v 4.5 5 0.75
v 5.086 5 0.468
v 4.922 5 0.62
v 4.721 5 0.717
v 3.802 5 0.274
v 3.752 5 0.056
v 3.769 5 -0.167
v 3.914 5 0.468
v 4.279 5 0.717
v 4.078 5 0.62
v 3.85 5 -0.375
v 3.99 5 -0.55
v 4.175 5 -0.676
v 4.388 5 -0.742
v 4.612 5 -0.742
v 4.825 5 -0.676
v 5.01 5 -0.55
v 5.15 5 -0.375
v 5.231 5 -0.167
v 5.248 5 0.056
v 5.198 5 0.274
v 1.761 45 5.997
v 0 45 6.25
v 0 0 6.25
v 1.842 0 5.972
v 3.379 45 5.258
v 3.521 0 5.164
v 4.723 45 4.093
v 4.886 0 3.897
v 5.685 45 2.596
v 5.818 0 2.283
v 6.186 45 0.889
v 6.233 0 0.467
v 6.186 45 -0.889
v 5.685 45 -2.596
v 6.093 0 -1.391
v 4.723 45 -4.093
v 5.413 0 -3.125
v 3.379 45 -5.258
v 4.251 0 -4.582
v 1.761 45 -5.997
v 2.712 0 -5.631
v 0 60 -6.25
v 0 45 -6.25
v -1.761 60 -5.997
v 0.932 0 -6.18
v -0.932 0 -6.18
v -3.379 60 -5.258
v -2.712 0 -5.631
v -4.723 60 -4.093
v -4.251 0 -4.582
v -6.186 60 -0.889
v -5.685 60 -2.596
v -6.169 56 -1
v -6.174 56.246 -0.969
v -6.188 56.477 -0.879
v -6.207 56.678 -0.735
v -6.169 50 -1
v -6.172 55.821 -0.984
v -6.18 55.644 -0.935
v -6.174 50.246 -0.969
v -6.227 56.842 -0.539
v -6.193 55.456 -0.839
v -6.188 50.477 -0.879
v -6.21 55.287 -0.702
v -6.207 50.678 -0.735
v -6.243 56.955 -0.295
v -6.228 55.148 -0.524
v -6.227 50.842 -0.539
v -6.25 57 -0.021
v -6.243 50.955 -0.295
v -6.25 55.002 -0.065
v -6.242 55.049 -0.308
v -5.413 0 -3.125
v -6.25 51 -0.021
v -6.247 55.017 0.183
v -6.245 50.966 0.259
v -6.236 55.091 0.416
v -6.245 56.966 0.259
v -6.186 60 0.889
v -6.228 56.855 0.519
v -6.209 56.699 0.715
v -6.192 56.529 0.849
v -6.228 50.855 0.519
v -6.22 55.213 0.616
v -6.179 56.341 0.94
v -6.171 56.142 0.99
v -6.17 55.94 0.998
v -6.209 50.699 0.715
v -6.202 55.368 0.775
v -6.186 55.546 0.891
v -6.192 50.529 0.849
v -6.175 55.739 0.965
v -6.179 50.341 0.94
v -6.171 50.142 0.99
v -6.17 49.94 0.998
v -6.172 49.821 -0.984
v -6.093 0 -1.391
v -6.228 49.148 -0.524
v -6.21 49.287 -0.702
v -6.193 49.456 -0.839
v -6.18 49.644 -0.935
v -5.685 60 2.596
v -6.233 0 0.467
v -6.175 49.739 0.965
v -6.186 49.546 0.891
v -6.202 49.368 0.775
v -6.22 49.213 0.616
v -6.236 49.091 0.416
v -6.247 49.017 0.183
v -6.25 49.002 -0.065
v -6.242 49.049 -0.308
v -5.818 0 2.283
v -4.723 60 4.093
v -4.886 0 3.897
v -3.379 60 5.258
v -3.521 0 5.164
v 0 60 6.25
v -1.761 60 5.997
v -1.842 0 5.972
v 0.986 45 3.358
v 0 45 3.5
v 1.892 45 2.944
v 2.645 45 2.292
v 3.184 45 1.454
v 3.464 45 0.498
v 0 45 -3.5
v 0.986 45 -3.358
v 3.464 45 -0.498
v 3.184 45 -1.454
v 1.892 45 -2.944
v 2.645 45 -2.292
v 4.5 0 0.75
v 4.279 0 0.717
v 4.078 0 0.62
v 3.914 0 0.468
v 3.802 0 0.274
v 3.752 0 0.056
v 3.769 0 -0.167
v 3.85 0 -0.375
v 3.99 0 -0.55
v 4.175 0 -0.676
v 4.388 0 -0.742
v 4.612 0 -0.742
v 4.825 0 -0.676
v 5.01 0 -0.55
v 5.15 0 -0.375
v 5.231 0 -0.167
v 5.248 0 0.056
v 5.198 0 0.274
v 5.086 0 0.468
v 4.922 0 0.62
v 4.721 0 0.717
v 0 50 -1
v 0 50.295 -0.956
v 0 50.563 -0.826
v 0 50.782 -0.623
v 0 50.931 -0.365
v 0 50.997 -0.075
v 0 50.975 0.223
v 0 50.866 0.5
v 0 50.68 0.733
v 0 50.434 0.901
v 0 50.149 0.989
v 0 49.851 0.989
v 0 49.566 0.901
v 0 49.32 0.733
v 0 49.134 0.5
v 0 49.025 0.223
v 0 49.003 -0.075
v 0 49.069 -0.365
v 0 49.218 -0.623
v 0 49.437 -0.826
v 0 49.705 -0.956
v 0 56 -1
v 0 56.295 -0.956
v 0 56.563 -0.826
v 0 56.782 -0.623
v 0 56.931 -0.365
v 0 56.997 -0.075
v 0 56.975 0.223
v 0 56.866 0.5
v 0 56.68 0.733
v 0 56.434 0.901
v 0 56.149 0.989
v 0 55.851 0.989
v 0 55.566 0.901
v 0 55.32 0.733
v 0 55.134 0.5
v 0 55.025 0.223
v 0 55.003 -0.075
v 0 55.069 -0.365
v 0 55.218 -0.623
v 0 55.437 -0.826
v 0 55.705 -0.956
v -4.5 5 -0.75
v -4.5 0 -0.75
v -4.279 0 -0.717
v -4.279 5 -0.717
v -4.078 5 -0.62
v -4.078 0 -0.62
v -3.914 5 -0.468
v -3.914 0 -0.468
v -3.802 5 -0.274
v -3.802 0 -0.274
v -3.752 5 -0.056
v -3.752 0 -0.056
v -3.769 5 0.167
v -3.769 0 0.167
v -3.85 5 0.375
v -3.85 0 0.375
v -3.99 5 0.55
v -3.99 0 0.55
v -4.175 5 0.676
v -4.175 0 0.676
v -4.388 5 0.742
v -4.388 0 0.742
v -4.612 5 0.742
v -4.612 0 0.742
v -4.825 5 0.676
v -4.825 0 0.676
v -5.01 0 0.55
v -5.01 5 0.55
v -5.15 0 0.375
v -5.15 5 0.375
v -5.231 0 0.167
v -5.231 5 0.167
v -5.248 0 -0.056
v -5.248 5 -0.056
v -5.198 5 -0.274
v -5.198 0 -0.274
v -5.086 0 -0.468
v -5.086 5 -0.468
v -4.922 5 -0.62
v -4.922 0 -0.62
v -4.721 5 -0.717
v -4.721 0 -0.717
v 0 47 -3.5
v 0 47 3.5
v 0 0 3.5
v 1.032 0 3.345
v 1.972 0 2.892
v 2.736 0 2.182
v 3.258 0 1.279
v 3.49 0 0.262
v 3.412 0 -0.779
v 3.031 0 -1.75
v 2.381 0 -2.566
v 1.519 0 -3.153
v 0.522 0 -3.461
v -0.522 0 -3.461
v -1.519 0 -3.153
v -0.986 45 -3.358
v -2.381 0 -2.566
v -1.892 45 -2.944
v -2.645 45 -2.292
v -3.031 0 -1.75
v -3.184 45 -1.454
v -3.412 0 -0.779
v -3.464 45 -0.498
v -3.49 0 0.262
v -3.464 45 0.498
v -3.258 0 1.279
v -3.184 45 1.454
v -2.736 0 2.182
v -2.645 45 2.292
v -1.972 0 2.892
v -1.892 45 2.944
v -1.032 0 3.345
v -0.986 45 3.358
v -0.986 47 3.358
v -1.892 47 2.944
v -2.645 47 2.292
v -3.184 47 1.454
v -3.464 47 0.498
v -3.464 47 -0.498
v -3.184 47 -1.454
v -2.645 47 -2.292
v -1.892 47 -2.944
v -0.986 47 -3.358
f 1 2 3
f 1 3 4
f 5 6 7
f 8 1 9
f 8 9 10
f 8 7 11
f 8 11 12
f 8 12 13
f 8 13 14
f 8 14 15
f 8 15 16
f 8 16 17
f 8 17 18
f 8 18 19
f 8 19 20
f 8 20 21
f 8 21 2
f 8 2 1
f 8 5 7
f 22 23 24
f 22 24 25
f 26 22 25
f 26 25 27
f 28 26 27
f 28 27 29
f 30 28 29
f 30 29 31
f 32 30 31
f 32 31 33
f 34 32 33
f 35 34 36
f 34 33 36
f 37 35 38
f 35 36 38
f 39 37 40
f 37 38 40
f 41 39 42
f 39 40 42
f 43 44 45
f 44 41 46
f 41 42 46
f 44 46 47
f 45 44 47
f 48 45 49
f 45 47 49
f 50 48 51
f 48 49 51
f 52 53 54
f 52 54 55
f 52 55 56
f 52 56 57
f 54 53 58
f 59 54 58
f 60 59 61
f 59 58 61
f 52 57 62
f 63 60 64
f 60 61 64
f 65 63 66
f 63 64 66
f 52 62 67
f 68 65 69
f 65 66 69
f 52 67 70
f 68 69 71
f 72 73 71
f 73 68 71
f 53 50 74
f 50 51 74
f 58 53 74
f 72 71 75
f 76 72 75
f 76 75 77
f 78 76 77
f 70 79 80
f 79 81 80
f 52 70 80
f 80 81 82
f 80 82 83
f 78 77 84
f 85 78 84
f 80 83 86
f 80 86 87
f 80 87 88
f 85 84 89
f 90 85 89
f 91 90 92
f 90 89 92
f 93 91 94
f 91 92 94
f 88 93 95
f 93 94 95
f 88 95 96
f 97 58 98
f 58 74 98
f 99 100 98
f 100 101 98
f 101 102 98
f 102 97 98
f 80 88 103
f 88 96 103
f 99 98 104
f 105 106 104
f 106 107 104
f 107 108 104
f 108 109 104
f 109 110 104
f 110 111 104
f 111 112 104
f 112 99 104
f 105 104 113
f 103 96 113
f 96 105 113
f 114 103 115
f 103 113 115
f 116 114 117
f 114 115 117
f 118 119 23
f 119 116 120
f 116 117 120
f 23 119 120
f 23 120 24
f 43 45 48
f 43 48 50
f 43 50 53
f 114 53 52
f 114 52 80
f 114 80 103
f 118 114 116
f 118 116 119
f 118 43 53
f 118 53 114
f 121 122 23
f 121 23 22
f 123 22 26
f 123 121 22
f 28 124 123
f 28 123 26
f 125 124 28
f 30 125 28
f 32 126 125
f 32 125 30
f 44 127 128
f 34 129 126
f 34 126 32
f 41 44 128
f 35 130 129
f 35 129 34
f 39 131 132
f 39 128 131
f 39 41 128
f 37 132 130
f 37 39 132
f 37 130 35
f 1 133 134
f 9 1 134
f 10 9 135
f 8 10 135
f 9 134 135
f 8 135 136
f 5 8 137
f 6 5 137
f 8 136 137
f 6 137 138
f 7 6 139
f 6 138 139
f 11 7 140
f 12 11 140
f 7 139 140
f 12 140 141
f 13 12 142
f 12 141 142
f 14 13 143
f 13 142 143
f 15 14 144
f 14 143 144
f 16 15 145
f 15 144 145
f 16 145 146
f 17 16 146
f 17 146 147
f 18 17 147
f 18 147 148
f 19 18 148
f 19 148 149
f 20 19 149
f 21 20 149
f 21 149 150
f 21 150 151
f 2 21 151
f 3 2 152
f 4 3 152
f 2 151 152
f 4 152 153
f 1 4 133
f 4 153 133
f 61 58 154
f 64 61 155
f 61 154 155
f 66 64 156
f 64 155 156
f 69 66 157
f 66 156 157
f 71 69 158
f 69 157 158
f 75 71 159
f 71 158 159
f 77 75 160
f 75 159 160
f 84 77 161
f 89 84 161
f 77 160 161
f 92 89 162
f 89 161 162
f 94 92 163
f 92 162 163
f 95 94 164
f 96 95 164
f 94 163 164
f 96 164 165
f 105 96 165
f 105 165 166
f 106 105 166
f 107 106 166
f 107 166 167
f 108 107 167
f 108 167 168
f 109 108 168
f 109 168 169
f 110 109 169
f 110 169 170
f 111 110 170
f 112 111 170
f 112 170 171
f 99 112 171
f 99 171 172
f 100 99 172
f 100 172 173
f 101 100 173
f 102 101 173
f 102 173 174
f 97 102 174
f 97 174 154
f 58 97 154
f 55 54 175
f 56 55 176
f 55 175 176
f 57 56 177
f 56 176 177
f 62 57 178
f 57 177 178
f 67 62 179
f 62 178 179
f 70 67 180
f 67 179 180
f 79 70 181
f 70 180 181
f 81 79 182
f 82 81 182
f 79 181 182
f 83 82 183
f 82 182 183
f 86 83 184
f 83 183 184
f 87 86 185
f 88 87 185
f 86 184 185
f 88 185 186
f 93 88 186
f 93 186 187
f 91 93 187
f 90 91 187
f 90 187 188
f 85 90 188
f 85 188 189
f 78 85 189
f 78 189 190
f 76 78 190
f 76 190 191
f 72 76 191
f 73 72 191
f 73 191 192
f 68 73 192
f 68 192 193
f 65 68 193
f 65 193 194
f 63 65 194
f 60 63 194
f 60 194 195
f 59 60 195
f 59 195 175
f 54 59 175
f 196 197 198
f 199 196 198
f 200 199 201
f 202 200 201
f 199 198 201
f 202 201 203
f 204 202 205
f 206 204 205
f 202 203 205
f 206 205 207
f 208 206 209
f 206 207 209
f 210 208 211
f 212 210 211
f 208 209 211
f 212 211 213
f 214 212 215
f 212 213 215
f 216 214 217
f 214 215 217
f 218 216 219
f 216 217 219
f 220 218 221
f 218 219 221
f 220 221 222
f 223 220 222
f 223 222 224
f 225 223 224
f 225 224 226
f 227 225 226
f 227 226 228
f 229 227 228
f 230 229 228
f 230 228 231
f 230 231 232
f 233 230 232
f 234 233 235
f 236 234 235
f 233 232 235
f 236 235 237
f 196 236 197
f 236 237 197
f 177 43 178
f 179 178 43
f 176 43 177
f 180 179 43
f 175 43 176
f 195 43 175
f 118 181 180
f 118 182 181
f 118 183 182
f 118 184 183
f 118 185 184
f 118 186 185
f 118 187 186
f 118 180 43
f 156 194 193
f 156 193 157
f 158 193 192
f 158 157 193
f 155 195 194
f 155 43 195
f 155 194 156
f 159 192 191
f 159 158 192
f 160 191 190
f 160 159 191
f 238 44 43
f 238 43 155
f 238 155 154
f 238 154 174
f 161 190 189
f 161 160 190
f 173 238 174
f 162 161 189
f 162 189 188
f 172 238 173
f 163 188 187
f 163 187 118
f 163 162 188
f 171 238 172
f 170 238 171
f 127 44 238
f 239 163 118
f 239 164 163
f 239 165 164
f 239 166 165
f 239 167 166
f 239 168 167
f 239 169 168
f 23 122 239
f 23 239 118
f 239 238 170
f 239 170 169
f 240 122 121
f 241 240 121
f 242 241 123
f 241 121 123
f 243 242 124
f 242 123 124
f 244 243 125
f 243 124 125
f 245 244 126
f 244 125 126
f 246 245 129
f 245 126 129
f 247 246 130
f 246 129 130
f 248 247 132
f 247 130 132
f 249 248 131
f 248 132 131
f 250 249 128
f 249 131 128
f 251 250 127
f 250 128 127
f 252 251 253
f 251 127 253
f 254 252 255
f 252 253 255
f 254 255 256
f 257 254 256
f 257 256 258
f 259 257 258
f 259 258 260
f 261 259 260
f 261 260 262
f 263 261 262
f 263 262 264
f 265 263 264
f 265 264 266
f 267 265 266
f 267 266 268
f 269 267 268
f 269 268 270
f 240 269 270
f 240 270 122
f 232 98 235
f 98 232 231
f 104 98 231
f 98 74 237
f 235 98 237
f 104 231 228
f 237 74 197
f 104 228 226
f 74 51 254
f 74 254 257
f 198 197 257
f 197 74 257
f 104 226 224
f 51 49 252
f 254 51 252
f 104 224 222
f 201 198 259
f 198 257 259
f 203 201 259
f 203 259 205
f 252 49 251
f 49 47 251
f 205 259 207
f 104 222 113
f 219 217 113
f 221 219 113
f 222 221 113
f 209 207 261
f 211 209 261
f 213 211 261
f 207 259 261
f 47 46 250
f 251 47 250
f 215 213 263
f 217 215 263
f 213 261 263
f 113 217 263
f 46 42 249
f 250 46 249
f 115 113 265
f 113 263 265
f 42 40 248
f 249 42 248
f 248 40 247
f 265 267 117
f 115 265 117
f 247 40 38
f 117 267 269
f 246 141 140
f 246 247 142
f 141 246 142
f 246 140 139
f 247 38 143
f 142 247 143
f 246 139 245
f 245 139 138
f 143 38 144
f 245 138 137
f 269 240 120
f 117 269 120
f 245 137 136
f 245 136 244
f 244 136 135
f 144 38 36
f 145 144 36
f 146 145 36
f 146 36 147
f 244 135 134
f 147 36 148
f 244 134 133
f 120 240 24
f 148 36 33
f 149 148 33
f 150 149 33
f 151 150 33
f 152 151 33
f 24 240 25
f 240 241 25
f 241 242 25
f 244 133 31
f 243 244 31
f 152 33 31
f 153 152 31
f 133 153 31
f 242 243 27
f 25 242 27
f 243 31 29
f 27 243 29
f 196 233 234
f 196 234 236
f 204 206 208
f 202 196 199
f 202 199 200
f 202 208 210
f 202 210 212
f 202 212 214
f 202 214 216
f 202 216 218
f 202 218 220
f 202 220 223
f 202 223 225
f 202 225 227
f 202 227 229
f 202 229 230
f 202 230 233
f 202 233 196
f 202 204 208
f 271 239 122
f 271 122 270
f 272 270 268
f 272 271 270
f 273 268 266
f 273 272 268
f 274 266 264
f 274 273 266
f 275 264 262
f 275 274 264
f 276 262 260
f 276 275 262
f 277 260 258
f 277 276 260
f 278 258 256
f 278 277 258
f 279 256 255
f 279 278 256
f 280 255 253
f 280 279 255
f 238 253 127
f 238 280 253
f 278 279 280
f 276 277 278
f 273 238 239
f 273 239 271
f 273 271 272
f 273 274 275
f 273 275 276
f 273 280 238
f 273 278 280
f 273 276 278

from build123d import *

# Parameters (mm, degrees)
SKETCH1_R           = 6.25
BOSS_EXTRUDE1_DEPTH = 60
CUT_EXTRUDE2_START  = -15
CUT_EXTRUDE2_DEPTH  = 15
SKETCH3_R           = 3.5
CUT_EXTRUDE3_DEPTH  = 46.85984082
CUT_EXTRUDE5_START  = -2
SKETCH7_R           = 3.5
CUT_EXTRUDE5_DEPTH  = 2
SKETCH8_R           = 1
CUT_EXTRUDE6_DEPTH  = 61.647547354
LPATTERN1_COUNT     = 2
LPATTERN1_PITCH     = 6
SKETCH9_R           = 0.75
CUT_EXTRUDE7_DEPTH  = 5
CIRPATTERN1_COUNT   = 2


with BuildPart() as part:
    # Sketch1 → Boss-Extrude1 (new body)
    with BuildSketch(Plane(origin=(0, 0, 0), x_dir=(1, 0, 0), z_dir=(0, 1, 0))):
        with Locations(Location((0, 0, 0), (0, 0, 270))):
            Circle(SKETCH1_R)
    extrude(amount=BOSS_EXTRUDE1_DEPTH)

    # Sketch2 → Cut-Extrude2 (cut)
    with BuildSketch(Plane(origin=(0, 60, 0), x_dir=(1, 0, 0), z_dir=(0, 1, 0)).offset(CUT_EXTRUDE2_START)):
        with BuildLine():
            Line((0, 6.25), (0, -6.25))
            ThreePointArc((0, -6.25), (6.25, 0), (0, 6.25))
        make_face()
    extrude(amount=CUT_EXTRUDE2_DEPTH, mode=Mode.SUBTRACT)

    # Sketch3 → Cut-Extrude3 (cut, through all)
    with BuildSketch(Plane(origin=(0, 45, 0), x_dir=(1, 0, 0), z_dir=(0, 1, 0))):
        with Locations(Location((0, 0, 0), (0, 0, 270))):
            Circle(SKETCH3_R)
    extrude(amount=-CUT_EXTRUDE3_DEPTH, mode=Mode.SUBTRACT)

    # Sketch7 → Cut-Extrude5 (cut)
    with BuildSketch(Plane.XZ.offset(-45).offset(CUT_EXTRUDE5_START)):
        with Locations(Location((0, 0, 0), (0, 0, 90))):
            Circle(SKETCH7_R)
    extrude(amount=CUT_EXTRUDE5_DEPTH, mode=Mode.SUBTRACT)

    # Sketch8 → Cut-Extrude6 (cut, through all)
    with BuildSketch(Plane(origin=(0, 0, 0), x_dir=(0, 0, -1), z_dir=(1, 0, 0))):
        with Locations((0, 56)):
            Circle(SKETCH8_R)
    cut_extrude6 = extrude(amount=-CUT_EXTRUDE6_DEPTH, mode=Mode.SUBTRACT)

    # LPattern1: Cut-Extrude6 ×2
    with Locations(*[(0, -i * LPATTERN1_PITCH, 0) for i in range(1, LPATTERN1_COUNT)]):
        add(cut_extrude6, mode=Mode.SUBTRACT)

    # Sketch9 → Cut-Extrude7 (cut)
    with BuildSketch(Plane.XZ):
        with Locations(Location((-4.5, 0, 0), (0, 0, 270))):
            Circle(SKETCH9_R)
    cut_extrude7 = extrude(amount=-CUT_EXTRUDE7_DEPTH, mode=Mode.SUBTRACT)

    # CirPattern1: Cut-Extrude7 ×2 about axis
    cirpattern1_axis = Axis((0, 0, 0), (0, 1, 0))
    for i in range(1, CIRPATTERN1_COUNT):
        add(cut_extrude7.rotate(cirpattern1_axis, i * 360 / CIRPATTERN1_COUNT), mode=Mode.SUBTRACT)


solid = part.part
